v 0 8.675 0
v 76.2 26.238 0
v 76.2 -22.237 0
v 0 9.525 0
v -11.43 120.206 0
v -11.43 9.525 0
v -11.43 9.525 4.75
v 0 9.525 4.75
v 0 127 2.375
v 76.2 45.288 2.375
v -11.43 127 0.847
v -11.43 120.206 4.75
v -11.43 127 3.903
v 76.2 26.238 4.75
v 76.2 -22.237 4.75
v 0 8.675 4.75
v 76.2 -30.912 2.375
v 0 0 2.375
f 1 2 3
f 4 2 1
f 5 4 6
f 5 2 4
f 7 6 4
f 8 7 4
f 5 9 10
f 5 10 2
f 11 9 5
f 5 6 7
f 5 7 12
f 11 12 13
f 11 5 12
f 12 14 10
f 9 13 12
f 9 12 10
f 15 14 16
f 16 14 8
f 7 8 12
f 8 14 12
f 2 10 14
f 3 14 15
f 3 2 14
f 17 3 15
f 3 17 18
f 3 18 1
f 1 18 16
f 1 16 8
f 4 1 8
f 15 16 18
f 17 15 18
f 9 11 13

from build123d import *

# Parameters (mm, degrees)
SKETCH2_W                = 11.43
SKETCH2_H                = 117.475
BOSS_EXTRUDE3_DEPTH      = 4.7498
CUT_EXTRUDE17_DEPTH      = 5.08
CUT_EXTRUDE17_DEPTH_BACK = 101.6
CUT_EXTRUDE18_DEPTH      = 101.6
CUT_EXTRUDE18_DEPTH_BACK = 127


with BuildPart() as part:
    # Sketch2 → Boss-Extrude3 (new body)
    with BuildSketch(Plane.XY):
        Polygon((76.2, -30.9118), (0, 0), (0, 127), (76.2, 45.2882), align=None)
        with Locations((-5.715, 68.2625)):
            Rectangle(SKETCH2_W, SKETCH2_H)
    extrude(amount=BOSS_EXTRUDE3_DEPTH)

    # Sketch8 → Cut-Extrude17 (cut, two sides: drawn at the far end of the back side and taken through both)
    with BuildSketch(Plane(origin=(0, 0, 0), x_dir=(0, 0, -1), z_dir=(-0.9266549506898317, 0.37591302499650847, 0)).offset(-CUT_EXTRUDE17_DEPTH_BACK)):
        Polygon((-2.3749, 0), (3e-09, -8.038518146), (0.750296228, -8.038518146), (0.750296228, 2.310233708), (-5.314343575, 2.310233708), (-5.314343575, -8.038518146), (-4.749800003, -8.038518146), align=None)
    extrude(amount=CUT_EXTRUDE17_DEPTH + CUT_EXTRUDE17_DEPTH_BACK, mode=Mode.SUBTRACT)

    # Sketch9 → Cut-Extrude18 (cut, two sides: drawn at the far end of the back side and taken through both)
    with BuildSketch(Plane(origin=(12.854537069, -13.784348584, 0), x_dir=(0, 0, -1), z_dir=(0.6820103942193665, -0.731342479401234, 0)).offset(-CUT_EXTRUDE18_DEPTH_BACK)):
        Polygon((-2.3749, 86.615320066), (0, 73.622586943), (0.872559858, 73.622586943), (0.872559858, 91.301528403), (-6.531219552, 91.301528403), (-6.531219552, 73.622586943), (-4.7498, 73.622586943), align=None)
    extrude(amount=CUT_EXTRUDE18_DEPTH + CUT_EXTRUDE18_DEPTH_BACK, mode=Mode.SUBTRACT)


solid = part.part
